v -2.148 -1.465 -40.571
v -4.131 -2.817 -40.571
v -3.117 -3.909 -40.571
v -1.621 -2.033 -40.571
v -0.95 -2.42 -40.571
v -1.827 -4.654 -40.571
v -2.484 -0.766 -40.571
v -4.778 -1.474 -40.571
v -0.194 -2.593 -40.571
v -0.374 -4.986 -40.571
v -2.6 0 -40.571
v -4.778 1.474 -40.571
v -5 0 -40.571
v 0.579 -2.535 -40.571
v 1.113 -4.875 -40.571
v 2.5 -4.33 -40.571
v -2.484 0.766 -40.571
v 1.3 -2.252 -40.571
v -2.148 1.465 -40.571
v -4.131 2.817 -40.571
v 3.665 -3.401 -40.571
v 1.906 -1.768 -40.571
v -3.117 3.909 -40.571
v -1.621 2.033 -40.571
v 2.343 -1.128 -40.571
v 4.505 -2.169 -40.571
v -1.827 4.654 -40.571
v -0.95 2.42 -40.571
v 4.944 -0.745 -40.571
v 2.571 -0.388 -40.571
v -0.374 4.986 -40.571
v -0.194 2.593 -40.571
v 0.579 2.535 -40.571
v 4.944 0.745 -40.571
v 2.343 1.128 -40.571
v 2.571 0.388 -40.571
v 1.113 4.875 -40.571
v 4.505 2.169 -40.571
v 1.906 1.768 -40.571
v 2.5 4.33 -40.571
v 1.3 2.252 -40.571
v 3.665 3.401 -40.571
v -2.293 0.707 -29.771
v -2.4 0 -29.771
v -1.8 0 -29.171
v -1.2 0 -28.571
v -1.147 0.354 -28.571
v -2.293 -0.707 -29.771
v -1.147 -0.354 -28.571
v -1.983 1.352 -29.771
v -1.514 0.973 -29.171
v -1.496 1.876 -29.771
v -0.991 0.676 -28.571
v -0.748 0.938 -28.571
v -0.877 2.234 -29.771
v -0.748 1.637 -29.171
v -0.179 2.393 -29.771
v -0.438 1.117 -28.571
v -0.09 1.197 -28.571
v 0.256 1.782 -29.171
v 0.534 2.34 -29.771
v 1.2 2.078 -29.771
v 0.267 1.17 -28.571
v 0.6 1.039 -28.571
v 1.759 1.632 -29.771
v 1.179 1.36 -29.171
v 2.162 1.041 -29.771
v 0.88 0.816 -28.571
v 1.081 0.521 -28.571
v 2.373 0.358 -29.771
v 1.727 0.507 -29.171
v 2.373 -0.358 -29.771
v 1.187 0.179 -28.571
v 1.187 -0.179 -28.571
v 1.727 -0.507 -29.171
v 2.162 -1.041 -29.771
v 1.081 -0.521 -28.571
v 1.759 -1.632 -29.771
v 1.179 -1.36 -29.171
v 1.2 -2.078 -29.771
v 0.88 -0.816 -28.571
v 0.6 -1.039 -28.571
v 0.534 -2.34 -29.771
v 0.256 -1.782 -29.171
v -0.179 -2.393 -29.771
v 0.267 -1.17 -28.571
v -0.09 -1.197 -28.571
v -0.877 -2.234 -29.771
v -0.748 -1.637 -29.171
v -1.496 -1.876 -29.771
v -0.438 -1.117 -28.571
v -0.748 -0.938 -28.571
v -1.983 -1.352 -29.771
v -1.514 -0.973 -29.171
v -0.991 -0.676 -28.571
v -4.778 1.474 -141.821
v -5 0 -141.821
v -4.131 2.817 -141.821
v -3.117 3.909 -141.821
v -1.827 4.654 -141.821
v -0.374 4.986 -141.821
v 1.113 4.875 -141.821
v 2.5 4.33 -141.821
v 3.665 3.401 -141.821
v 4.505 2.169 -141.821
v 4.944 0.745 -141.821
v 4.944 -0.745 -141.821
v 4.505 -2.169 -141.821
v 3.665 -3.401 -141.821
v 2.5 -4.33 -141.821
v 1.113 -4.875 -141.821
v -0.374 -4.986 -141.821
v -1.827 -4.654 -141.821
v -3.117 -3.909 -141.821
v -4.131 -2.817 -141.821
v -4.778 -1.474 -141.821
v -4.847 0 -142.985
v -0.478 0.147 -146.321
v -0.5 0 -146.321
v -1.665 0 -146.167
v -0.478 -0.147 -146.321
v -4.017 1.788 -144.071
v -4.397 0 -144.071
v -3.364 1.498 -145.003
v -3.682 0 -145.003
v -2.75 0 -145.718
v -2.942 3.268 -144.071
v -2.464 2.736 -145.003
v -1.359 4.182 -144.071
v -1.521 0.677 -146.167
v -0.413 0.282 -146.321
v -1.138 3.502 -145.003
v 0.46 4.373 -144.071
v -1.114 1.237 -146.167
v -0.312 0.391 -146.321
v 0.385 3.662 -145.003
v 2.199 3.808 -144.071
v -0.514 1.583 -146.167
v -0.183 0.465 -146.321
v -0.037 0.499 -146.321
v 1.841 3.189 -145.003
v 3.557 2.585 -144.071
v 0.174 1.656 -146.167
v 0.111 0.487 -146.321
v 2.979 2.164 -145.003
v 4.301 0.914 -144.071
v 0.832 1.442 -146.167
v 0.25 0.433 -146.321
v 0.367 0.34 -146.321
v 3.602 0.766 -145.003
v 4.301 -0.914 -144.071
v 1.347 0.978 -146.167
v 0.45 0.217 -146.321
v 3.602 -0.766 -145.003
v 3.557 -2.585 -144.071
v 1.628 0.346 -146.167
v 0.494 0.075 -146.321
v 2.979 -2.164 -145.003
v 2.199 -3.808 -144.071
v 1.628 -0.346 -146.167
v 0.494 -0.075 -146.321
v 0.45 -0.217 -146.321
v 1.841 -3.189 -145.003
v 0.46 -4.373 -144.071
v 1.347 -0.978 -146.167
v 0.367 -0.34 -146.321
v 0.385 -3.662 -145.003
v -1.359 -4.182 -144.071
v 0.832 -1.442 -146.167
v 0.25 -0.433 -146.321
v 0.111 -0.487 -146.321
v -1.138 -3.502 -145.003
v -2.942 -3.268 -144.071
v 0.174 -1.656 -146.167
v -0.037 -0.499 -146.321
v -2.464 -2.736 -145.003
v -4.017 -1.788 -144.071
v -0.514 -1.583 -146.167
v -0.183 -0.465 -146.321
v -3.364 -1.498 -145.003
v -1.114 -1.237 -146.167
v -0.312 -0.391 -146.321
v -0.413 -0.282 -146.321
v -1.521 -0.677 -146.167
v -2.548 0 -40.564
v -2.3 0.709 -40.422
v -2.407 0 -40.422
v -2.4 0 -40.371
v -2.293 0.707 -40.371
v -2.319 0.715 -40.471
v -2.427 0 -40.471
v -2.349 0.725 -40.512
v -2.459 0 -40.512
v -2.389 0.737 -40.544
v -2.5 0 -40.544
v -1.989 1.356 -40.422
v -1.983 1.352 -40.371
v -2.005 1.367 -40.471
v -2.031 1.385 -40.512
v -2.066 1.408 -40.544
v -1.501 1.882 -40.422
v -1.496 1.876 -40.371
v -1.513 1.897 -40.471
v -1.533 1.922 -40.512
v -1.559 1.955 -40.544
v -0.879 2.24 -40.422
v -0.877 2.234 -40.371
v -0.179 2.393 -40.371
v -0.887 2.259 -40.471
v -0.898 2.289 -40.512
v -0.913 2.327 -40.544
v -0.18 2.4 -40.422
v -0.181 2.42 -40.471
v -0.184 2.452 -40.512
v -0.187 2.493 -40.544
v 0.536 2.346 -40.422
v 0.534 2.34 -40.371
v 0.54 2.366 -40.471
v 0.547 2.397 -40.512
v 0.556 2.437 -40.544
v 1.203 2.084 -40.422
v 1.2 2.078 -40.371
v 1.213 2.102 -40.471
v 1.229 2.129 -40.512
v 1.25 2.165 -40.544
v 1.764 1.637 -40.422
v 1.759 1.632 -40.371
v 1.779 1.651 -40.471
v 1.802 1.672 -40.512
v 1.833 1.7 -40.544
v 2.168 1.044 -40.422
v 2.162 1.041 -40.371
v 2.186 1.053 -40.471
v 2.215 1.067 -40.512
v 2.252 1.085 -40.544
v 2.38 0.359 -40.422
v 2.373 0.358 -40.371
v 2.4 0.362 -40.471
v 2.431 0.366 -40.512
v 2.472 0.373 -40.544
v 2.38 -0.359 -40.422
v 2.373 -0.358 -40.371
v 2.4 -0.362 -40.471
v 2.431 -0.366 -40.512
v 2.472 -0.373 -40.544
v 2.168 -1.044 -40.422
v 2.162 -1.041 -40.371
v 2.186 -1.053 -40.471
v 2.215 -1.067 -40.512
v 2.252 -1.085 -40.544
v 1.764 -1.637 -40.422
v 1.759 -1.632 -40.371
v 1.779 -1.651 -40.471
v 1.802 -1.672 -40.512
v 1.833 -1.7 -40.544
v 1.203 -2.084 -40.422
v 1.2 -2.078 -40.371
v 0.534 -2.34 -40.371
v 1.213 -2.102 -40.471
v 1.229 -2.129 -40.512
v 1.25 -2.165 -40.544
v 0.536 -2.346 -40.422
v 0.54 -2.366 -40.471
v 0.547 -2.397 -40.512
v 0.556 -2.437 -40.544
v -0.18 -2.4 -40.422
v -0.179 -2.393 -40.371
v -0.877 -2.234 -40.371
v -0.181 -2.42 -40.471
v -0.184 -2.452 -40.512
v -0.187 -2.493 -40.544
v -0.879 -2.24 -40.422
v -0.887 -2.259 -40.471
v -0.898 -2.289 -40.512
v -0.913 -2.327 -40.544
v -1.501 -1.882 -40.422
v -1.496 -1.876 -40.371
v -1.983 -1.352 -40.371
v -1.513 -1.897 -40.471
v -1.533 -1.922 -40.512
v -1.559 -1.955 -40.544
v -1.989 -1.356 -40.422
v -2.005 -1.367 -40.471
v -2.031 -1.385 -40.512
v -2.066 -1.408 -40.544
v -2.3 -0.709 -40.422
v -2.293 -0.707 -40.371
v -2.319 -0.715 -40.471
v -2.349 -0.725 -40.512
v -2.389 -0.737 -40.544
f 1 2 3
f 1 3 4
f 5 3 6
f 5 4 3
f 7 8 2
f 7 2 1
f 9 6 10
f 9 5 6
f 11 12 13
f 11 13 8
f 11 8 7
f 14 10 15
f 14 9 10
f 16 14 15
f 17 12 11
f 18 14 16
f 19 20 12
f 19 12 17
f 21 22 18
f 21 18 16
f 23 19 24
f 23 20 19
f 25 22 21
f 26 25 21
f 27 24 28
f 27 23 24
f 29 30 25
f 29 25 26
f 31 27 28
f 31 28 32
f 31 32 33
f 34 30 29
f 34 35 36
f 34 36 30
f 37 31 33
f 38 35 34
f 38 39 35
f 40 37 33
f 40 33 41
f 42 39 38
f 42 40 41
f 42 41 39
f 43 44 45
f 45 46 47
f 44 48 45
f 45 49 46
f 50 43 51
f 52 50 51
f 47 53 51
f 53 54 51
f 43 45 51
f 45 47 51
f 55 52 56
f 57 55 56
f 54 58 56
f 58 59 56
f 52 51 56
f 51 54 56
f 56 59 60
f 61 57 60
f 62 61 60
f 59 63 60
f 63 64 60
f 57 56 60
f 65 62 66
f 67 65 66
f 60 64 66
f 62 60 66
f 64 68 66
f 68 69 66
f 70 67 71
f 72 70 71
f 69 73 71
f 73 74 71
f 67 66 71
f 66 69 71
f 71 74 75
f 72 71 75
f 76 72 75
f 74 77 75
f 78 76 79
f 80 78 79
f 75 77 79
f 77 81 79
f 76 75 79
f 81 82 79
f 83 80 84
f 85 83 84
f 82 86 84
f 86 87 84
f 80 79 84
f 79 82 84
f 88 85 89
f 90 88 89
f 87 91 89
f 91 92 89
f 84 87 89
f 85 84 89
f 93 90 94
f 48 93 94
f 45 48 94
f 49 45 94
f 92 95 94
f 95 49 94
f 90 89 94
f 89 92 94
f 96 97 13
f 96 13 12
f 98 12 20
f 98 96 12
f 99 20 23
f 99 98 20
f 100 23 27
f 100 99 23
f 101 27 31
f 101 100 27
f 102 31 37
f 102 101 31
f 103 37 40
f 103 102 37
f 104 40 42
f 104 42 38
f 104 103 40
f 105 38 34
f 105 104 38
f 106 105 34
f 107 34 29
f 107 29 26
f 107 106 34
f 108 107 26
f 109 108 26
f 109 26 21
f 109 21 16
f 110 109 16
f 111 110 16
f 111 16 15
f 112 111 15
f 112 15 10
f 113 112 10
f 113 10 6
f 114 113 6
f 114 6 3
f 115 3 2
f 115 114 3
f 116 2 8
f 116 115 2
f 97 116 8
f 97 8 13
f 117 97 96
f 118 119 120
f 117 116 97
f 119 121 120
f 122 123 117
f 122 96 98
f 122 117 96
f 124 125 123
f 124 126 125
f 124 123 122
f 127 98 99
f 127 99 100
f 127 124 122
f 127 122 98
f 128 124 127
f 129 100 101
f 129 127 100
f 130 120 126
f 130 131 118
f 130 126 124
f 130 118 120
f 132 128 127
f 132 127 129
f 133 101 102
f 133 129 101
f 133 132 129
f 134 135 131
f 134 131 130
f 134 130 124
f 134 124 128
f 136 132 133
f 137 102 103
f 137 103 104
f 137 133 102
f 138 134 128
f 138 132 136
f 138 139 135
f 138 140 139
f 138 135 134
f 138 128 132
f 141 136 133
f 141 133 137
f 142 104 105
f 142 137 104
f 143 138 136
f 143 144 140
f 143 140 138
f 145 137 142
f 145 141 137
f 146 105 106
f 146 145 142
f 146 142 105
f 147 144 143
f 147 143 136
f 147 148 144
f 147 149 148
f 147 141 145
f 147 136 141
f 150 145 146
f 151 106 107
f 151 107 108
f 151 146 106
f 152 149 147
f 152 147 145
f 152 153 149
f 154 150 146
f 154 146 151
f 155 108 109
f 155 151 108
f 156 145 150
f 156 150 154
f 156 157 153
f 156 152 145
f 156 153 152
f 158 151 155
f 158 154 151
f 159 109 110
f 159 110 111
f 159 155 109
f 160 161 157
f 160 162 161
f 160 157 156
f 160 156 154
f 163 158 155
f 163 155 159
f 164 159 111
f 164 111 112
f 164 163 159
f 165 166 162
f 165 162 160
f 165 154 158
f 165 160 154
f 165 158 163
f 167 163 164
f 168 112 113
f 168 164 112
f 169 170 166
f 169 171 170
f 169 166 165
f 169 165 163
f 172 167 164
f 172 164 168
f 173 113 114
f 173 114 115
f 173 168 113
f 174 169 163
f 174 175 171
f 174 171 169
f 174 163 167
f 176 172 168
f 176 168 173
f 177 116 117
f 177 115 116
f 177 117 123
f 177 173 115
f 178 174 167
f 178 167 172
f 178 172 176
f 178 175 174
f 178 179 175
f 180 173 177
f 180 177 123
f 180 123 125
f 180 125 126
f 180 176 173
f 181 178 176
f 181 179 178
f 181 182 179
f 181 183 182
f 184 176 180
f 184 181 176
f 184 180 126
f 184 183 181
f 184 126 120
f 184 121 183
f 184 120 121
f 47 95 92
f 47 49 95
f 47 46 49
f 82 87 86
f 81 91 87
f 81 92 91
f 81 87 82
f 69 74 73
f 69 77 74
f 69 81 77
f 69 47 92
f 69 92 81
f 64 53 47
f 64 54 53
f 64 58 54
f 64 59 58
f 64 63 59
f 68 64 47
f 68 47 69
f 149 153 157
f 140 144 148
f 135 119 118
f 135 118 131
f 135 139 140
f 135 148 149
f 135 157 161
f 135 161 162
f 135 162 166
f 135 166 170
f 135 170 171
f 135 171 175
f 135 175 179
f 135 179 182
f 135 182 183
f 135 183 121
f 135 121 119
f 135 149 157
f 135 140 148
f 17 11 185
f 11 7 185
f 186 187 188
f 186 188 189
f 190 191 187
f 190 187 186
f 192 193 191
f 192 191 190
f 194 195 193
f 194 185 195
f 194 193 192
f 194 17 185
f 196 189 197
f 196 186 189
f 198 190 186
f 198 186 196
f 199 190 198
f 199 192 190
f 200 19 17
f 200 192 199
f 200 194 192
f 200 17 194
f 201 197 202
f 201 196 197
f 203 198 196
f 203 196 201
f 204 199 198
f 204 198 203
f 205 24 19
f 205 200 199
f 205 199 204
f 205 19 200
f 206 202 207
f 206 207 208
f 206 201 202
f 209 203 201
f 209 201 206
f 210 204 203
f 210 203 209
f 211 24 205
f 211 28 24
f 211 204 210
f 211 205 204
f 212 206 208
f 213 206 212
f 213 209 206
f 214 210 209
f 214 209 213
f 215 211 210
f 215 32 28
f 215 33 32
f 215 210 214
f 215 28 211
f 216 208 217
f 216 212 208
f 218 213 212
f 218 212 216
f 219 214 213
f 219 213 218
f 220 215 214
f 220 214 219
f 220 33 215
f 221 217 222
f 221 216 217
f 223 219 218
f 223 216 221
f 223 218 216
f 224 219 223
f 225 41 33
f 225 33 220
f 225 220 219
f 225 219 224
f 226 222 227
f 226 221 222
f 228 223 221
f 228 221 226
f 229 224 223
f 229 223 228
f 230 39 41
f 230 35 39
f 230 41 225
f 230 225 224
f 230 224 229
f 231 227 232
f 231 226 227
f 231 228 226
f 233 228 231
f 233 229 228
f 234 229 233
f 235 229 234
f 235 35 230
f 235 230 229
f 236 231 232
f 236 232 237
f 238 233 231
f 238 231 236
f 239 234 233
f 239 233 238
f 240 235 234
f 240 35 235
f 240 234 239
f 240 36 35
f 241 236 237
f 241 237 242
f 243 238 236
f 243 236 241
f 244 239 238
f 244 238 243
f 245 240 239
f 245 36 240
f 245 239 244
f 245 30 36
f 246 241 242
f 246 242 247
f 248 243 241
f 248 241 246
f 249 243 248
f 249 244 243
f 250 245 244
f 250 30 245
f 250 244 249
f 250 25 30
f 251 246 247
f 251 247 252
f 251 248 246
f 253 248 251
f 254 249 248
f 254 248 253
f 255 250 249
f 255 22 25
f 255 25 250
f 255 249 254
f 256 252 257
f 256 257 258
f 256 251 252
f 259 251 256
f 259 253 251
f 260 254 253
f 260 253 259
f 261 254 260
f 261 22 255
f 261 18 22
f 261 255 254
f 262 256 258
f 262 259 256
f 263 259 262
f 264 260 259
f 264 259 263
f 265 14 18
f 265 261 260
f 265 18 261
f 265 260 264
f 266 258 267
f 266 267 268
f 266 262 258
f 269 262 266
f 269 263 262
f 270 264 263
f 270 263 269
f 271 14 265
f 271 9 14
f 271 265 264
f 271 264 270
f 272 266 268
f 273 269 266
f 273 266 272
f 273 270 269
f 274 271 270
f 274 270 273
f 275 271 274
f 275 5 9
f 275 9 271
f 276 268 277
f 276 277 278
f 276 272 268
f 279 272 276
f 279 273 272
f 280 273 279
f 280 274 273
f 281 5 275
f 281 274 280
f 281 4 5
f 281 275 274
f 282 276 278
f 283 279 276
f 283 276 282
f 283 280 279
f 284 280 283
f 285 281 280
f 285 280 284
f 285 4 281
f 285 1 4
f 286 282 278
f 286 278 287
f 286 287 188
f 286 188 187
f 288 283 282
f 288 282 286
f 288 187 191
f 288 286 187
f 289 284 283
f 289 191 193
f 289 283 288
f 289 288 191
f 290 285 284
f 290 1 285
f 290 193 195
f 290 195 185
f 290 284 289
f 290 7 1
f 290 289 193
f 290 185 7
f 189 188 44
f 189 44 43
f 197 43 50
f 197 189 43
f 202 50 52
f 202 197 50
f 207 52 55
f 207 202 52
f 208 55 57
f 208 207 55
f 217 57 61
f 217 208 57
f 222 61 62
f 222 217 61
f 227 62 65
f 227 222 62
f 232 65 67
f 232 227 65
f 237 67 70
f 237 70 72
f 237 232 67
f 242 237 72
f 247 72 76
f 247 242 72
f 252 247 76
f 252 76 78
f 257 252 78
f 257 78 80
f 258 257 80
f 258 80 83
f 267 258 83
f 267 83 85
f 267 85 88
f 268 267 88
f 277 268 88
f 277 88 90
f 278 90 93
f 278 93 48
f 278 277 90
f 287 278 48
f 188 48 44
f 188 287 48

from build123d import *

# Parameters (mm, degrees)
F2_R    = 4.5
F3_SIZE = 1.2
F4_R    = 0.2


with BuildPart() as f1:
    # F0 (on Front) → F1 (revolve)
    with BuildSketch(Plane.XZ):
        Polygon((-2.4, -40.570669), (-5, -40.570669), (-5, -146.320669), (0, -146.320669), (0, -28.570669), (-2.4, -28.570669), align=None)
    revolve(axis=Axis((0, 0, -136.627736), (0, 0, -1)))

    # F2
    f2_edges = [f1.edges().sort_by_distance(p)[0] for p in [
        (5, 0, -146.320669),
    ]]
    fillet(f2_edges, radius=F2_R)

    # F3
    f3_edges = [f1.edges().sort_by_distance(p)[0] for p in [
        (2.4, 0, -28.570669),
    ]]
    chamfer(f3_edges, length=F3_SIZE)

    # F4
    f4_edges = [f1.edges().sort_by_distance(p)[0] for p in [
        (2.4, 0, -40.570669),
    ]]
    fillet(f4_edges, radius=F4_R)


solid = f1.part
